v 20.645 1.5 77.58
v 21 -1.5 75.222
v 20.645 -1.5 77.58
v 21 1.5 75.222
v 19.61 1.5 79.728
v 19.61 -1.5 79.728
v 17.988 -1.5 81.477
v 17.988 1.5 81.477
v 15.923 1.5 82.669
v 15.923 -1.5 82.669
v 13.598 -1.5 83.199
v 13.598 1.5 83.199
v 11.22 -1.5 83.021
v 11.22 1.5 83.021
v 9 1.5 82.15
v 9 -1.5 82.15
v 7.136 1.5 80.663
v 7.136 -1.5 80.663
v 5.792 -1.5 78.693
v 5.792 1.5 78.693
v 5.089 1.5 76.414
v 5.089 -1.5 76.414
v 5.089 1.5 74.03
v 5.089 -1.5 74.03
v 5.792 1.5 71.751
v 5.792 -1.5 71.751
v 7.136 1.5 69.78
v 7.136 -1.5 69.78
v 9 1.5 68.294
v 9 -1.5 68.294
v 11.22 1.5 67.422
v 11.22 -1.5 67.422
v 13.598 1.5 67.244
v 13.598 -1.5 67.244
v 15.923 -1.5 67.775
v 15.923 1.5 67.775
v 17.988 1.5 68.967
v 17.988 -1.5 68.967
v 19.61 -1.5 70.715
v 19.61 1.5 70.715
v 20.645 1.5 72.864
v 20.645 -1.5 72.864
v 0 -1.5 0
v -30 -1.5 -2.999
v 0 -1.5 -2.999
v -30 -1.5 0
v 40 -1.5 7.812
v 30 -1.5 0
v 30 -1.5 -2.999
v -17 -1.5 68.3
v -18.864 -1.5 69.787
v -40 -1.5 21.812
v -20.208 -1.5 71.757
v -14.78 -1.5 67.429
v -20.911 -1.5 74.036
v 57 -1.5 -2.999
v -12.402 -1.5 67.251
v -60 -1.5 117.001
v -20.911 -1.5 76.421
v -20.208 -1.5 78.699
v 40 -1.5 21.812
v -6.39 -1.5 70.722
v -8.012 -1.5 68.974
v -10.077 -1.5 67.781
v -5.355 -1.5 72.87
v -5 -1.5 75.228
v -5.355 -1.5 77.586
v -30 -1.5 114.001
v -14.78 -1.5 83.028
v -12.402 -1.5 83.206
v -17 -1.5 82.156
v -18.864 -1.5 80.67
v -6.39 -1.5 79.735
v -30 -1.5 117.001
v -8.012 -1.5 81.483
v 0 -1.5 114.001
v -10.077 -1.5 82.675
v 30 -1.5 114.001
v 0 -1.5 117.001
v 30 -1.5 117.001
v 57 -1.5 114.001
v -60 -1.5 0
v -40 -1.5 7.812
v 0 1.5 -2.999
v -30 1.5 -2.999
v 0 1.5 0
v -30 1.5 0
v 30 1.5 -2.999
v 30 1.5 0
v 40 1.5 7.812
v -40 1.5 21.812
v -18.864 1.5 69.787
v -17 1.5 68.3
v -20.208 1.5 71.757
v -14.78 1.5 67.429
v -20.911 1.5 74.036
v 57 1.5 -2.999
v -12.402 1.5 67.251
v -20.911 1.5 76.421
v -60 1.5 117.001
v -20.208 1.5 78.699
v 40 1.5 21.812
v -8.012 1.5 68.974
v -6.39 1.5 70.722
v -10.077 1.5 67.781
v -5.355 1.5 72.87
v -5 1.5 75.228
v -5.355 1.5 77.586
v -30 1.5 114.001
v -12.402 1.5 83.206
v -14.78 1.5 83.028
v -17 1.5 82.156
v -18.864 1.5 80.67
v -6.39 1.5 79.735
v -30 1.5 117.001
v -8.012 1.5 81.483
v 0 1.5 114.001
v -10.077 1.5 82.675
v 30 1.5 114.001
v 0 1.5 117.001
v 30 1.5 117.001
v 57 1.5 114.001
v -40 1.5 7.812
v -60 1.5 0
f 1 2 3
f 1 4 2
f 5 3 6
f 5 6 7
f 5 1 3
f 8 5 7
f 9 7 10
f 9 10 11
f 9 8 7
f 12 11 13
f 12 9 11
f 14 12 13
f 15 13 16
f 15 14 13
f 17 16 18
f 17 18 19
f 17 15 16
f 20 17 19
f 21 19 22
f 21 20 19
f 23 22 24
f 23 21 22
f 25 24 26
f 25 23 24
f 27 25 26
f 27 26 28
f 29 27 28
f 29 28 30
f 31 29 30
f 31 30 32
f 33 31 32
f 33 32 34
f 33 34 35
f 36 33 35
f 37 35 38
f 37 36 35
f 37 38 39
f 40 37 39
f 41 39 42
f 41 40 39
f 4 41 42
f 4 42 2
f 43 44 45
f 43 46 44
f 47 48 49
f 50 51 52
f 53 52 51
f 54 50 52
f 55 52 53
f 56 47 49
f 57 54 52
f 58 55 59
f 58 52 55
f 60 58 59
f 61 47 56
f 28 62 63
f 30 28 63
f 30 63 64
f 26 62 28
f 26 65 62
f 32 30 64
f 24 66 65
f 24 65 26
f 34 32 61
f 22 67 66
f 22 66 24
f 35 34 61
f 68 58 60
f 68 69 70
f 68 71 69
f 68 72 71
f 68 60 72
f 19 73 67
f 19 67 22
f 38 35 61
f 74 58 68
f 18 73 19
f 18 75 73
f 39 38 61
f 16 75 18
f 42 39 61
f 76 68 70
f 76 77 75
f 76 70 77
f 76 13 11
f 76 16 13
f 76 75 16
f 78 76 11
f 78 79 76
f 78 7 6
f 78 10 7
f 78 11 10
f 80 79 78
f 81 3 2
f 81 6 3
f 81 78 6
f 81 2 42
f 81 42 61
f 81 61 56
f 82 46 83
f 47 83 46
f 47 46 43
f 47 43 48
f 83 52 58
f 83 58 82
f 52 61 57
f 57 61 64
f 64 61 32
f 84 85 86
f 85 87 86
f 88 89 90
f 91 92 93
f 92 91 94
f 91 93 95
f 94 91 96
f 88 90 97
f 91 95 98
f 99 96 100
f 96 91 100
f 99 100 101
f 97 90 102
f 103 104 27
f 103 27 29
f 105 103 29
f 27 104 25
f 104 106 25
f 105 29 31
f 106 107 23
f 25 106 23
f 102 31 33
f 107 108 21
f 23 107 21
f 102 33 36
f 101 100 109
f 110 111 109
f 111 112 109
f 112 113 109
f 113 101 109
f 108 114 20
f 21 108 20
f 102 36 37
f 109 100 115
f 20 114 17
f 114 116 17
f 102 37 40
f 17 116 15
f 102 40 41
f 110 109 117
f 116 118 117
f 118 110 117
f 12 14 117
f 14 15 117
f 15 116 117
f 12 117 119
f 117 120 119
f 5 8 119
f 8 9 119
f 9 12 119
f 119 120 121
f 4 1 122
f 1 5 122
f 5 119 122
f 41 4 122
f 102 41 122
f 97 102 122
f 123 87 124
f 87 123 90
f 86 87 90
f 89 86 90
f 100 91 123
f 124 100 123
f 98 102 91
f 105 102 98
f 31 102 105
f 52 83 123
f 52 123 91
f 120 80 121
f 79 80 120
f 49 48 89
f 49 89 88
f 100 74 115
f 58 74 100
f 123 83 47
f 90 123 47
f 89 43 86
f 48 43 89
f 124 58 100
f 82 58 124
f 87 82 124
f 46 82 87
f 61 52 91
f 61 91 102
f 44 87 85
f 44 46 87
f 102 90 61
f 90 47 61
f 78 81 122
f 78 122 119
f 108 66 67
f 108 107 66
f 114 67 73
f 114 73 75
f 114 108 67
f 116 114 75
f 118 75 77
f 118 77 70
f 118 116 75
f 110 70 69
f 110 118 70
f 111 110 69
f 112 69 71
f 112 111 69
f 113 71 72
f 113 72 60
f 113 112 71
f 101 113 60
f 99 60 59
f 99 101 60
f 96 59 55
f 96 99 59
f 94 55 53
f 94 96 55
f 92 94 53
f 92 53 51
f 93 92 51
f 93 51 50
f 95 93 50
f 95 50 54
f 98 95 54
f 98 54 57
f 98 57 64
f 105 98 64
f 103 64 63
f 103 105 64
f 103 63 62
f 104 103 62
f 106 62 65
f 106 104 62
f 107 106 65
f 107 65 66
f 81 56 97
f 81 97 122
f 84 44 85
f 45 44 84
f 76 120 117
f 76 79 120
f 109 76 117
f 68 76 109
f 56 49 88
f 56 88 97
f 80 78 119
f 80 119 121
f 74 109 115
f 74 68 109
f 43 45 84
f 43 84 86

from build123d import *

# Parameters (mm, degrees)
F0_W     = 80
F0_H     = 14
F0_R     = 8
F1_DEPTH = 1.5


# Not quite as in the source:
# - a feature names something its author has since deleted; it is built from what else it names


with BuildPart() as f1:
    # F0 (on Front) → F1 (new body, symmetric)
    with BuildSketch(Plane.XZ):
        Polygon((-30, -2.9994321861), (0, -2.9994321861), (0, 0), (30, 0), (30, -2.9994321861), (57, -2.9994321861), (57, 114.0005678139), (30, 114.0005678139), (30, 117.0005678139), (0, 117.0005678139), (0, 114.0005678139), (-30, 114.0005678139), (-30, 117.0005678139), (-60, 117.0005678139), (-60, 0), (-30, 0), align=None)
        with Locations((0, 14.8116284981)):
            Rectangle(F0_W, F0_H, mode=Mode.SUBTRACT)
        with Locations((-13, 75.2281695604)):
            Circle(F0_R, mode=Mode.SUBTRACT)
        with Locations((13, 75.2218647463)):
            Circle(F0_R, mode=Mode.SUBTRACT)
    extrude(amount=F1_DEPTH, both=True)


solid = f1.part
